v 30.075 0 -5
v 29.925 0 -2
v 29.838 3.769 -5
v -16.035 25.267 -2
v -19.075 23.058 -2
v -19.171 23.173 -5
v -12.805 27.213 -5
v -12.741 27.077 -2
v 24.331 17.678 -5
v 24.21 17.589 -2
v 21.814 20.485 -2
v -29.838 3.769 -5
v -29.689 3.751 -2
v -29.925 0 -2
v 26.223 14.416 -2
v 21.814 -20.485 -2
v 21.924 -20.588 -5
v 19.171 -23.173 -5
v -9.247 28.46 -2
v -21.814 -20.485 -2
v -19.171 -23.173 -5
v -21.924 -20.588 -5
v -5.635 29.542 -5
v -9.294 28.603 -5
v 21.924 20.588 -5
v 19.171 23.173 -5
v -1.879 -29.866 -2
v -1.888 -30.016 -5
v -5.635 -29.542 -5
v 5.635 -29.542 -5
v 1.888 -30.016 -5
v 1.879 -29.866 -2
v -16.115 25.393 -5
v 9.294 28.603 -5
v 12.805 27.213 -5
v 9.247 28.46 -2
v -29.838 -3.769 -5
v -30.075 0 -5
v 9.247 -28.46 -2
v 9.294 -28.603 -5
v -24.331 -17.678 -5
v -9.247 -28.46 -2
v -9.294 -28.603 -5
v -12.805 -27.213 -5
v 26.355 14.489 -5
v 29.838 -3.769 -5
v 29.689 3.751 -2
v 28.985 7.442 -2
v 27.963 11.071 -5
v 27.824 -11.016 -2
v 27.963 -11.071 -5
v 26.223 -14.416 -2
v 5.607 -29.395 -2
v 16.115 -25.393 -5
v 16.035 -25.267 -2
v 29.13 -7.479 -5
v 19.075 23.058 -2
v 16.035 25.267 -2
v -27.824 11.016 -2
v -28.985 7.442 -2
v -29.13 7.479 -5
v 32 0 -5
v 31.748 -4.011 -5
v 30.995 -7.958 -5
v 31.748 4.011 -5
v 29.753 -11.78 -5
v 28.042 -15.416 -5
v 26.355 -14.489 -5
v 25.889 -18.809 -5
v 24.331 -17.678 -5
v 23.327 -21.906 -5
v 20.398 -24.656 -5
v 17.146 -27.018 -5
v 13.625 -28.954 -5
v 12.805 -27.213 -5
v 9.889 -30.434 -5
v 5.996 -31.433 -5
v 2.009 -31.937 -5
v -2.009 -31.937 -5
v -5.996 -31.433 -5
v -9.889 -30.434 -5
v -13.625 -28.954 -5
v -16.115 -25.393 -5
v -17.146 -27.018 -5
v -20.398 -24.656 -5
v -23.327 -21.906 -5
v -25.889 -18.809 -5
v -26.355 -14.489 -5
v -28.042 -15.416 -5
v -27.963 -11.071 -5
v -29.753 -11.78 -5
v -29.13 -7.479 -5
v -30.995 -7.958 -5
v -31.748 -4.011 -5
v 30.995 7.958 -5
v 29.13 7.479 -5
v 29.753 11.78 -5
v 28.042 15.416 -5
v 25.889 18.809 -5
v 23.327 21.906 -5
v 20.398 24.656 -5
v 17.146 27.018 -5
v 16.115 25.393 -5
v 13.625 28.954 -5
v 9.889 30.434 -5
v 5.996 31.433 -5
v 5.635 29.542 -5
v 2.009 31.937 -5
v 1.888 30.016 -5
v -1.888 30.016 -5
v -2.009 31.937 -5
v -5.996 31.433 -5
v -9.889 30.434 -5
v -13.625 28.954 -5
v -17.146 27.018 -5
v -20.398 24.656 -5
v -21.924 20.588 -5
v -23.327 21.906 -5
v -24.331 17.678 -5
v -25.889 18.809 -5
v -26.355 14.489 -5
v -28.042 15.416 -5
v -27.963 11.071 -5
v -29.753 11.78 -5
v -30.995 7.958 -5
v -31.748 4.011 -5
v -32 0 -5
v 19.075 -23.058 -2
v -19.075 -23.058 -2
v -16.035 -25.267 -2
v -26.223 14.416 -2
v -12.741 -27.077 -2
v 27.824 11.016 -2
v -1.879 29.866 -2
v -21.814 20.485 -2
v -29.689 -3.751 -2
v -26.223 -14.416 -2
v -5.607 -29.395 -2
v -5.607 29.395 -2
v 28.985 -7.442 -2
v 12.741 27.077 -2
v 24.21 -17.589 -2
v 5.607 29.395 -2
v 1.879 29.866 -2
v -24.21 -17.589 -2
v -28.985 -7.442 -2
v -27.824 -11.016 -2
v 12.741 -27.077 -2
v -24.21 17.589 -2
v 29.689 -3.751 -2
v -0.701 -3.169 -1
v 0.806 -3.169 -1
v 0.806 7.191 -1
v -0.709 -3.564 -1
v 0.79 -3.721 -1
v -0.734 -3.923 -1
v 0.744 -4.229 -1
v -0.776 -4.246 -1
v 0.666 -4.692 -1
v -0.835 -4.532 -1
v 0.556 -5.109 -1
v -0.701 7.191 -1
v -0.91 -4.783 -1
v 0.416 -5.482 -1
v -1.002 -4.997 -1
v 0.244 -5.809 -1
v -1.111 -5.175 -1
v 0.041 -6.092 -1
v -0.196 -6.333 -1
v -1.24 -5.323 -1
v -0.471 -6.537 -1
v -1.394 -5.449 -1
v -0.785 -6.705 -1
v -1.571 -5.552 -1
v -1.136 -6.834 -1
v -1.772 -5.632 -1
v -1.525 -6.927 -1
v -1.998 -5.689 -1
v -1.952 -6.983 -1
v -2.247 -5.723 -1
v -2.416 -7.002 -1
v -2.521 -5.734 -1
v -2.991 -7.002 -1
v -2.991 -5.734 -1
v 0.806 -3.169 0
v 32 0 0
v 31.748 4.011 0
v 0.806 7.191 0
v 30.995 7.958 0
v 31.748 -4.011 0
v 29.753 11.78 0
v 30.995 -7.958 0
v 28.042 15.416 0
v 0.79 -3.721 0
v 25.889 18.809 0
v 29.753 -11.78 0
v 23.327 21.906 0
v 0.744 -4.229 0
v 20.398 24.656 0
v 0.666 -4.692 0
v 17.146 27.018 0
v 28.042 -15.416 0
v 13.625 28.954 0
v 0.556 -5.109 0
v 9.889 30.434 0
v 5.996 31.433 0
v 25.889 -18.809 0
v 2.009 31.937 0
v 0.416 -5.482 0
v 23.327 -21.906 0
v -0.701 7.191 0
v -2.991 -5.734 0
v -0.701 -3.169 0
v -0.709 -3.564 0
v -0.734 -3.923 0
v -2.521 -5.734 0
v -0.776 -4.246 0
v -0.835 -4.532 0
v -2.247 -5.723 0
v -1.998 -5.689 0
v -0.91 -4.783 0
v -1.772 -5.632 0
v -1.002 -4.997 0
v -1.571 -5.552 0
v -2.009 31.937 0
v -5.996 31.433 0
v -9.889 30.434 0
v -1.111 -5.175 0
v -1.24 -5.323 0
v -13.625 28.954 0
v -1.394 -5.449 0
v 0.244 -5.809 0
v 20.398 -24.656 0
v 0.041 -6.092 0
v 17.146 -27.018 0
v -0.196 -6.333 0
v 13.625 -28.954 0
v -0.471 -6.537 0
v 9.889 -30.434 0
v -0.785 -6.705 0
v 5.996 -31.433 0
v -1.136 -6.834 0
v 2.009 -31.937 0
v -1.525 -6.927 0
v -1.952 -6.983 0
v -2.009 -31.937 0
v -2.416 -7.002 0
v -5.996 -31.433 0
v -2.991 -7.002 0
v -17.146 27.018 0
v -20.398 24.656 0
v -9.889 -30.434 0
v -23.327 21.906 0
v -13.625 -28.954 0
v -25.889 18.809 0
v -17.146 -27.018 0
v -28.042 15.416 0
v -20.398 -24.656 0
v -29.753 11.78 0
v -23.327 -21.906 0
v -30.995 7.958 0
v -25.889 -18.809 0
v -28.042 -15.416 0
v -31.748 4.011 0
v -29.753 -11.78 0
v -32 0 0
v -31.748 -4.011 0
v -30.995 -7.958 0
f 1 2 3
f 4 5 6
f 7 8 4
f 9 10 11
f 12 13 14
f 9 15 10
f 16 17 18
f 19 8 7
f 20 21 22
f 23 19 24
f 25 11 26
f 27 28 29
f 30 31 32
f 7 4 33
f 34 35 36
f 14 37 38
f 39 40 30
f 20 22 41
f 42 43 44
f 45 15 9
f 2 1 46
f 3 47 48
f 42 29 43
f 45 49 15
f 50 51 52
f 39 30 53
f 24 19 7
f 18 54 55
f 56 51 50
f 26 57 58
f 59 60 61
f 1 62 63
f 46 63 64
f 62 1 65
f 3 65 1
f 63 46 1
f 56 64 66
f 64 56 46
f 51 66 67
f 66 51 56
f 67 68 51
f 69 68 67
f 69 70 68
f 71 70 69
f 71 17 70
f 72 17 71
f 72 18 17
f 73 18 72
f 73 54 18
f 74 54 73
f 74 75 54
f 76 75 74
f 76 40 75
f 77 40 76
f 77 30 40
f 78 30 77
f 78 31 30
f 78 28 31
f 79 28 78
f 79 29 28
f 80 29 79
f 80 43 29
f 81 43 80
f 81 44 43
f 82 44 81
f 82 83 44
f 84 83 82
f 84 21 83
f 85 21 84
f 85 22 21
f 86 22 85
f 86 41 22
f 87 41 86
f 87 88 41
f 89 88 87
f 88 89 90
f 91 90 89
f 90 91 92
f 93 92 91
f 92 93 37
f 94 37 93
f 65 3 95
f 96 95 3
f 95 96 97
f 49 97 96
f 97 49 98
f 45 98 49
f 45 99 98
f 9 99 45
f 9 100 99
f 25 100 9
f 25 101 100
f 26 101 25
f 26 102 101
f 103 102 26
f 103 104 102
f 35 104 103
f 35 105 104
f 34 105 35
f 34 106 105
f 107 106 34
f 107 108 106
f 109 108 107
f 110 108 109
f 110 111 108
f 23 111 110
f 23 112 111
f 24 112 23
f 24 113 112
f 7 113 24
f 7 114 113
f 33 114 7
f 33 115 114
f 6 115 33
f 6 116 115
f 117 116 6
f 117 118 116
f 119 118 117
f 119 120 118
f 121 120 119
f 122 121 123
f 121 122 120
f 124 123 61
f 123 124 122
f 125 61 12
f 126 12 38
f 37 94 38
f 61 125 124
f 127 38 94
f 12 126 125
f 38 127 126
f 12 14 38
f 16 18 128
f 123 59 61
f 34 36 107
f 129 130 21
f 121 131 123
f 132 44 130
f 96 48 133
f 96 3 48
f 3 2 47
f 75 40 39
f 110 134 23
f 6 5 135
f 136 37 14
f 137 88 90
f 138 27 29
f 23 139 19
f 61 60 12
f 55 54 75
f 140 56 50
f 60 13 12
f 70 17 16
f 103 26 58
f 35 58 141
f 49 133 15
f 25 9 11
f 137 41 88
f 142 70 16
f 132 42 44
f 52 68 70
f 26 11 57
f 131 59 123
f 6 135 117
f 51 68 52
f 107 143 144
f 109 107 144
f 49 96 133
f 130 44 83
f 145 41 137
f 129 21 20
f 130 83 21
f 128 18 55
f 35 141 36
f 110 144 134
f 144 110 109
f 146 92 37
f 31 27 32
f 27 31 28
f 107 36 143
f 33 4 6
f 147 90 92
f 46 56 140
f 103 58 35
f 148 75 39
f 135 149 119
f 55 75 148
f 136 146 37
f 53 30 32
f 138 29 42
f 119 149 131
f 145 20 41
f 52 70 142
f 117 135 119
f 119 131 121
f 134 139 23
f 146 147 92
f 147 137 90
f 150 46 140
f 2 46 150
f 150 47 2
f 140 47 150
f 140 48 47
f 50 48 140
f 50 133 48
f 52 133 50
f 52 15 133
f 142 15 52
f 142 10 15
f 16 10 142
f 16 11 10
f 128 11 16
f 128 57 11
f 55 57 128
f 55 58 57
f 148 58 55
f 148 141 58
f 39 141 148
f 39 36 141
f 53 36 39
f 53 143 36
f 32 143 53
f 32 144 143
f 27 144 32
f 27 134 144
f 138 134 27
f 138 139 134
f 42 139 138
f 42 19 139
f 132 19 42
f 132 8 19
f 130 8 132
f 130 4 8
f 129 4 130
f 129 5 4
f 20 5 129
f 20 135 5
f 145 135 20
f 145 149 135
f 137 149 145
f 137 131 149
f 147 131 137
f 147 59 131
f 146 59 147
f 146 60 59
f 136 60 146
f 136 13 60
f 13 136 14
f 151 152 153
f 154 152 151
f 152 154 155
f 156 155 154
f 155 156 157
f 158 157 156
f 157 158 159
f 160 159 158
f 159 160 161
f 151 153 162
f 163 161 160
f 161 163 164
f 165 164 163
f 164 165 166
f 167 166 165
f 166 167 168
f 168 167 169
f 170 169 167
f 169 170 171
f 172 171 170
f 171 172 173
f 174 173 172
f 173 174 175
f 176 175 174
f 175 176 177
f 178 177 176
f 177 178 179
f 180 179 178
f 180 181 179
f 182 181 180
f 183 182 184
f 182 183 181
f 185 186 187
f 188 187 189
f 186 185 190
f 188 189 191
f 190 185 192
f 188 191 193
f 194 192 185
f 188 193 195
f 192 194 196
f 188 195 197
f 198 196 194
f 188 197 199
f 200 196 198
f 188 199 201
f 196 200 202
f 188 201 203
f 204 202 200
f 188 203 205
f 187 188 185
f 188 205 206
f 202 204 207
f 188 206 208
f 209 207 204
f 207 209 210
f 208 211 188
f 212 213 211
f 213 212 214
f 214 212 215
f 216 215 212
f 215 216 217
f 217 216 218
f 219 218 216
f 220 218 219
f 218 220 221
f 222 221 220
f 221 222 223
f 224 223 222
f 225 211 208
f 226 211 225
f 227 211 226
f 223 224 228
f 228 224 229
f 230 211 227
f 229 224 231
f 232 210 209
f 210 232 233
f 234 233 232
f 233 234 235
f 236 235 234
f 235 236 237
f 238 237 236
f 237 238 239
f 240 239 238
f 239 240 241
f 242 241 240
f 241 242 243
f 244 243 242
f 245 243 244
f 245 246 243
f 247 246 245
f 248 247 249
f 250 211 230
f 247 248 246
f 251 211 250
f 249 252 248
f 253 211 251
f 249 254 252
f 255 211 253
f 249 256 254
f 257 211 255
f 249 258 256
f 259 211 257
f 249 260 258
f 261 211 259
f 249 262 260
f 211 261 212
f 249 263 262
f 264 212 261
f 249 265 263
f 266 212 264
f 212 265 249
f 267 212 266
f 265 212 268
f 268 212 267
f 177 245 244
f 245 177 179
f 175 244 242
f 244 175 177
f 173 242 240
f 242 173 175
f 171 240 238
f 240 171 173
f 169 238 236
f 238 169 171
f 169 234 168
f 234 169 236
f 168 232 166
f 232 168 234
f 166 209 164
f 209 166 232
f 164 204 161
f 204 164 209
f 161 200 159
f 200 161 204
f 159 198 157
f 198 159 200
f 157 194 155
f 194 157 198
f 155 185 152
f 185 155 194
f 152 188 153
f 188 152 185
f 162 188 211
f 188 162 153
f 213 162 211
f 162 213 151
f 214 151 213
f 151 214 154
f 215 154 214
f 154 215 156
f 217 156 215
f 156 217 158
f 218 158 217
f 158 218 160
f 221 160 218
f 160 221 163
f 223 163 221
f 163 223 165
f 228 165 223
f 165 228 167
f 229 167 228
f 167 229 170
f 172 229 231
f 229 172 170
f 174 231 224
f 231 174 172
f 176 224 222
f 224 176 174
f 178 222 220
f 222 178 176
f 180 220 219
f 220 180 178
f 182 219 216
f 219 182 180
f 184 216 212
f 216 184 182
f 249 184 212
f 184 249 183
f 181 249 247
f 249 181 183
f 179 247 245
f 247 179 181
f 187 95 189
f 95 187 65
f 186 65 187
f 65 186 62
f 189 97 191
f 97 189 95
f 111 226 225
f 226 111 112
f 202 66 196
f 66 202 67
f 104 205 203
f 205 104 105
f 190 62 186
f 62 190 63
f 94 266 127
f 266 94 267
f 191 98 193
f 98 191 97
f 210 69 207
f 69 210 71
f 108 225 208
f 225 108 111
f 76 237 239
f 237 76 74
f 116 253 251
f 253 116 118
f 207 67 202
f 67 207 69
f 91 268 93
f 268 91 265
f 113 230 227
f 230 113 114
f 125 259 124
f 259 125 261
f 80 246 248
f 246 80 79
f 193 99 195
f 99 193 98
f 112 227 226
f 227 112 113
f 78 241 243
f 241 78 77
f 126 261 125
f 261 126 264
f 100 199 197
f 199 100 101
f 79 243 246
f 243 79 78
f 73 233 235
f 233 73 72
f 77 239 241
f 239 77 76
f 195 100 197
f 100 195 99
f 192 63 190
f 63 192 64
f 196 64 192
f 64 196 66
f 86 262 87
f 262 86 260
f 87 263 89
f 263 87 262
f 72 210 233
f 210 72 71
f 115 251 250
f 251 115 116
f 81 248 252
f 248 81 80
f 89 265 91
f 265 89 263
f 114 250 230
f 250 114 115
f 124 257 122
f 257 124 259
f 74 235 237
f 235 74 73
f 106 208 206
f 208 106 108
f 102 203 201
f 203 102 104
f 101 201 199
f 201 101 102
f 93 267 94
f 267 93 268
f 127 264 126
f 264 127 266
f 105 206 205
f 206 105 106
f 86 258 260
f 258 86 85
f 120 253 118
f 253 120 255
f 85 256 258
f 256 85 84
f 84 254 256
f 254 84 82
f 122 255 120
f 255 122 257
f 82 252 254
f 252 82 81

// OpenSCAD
$fn = 50;


difference() {
	union() {
		translate(v = [0, 0, -5.0000000000]) {
			cylinder(h = 5, r = 32.0000000000);
		}
	}
	union() {
		#translate(v = [0, 0, -5.0000000000]) {
			cylinder(h = 3, r1 = 30.0750000000, r2 = 29.9250000000);
		}
		translate(v = [0, 0, -1]) {
			linear_extrude(height = 1) {
				text(font = "Wingdings", halign = "center", size = 11, text = "J", valign = "center");
			}
		}
	}
}
